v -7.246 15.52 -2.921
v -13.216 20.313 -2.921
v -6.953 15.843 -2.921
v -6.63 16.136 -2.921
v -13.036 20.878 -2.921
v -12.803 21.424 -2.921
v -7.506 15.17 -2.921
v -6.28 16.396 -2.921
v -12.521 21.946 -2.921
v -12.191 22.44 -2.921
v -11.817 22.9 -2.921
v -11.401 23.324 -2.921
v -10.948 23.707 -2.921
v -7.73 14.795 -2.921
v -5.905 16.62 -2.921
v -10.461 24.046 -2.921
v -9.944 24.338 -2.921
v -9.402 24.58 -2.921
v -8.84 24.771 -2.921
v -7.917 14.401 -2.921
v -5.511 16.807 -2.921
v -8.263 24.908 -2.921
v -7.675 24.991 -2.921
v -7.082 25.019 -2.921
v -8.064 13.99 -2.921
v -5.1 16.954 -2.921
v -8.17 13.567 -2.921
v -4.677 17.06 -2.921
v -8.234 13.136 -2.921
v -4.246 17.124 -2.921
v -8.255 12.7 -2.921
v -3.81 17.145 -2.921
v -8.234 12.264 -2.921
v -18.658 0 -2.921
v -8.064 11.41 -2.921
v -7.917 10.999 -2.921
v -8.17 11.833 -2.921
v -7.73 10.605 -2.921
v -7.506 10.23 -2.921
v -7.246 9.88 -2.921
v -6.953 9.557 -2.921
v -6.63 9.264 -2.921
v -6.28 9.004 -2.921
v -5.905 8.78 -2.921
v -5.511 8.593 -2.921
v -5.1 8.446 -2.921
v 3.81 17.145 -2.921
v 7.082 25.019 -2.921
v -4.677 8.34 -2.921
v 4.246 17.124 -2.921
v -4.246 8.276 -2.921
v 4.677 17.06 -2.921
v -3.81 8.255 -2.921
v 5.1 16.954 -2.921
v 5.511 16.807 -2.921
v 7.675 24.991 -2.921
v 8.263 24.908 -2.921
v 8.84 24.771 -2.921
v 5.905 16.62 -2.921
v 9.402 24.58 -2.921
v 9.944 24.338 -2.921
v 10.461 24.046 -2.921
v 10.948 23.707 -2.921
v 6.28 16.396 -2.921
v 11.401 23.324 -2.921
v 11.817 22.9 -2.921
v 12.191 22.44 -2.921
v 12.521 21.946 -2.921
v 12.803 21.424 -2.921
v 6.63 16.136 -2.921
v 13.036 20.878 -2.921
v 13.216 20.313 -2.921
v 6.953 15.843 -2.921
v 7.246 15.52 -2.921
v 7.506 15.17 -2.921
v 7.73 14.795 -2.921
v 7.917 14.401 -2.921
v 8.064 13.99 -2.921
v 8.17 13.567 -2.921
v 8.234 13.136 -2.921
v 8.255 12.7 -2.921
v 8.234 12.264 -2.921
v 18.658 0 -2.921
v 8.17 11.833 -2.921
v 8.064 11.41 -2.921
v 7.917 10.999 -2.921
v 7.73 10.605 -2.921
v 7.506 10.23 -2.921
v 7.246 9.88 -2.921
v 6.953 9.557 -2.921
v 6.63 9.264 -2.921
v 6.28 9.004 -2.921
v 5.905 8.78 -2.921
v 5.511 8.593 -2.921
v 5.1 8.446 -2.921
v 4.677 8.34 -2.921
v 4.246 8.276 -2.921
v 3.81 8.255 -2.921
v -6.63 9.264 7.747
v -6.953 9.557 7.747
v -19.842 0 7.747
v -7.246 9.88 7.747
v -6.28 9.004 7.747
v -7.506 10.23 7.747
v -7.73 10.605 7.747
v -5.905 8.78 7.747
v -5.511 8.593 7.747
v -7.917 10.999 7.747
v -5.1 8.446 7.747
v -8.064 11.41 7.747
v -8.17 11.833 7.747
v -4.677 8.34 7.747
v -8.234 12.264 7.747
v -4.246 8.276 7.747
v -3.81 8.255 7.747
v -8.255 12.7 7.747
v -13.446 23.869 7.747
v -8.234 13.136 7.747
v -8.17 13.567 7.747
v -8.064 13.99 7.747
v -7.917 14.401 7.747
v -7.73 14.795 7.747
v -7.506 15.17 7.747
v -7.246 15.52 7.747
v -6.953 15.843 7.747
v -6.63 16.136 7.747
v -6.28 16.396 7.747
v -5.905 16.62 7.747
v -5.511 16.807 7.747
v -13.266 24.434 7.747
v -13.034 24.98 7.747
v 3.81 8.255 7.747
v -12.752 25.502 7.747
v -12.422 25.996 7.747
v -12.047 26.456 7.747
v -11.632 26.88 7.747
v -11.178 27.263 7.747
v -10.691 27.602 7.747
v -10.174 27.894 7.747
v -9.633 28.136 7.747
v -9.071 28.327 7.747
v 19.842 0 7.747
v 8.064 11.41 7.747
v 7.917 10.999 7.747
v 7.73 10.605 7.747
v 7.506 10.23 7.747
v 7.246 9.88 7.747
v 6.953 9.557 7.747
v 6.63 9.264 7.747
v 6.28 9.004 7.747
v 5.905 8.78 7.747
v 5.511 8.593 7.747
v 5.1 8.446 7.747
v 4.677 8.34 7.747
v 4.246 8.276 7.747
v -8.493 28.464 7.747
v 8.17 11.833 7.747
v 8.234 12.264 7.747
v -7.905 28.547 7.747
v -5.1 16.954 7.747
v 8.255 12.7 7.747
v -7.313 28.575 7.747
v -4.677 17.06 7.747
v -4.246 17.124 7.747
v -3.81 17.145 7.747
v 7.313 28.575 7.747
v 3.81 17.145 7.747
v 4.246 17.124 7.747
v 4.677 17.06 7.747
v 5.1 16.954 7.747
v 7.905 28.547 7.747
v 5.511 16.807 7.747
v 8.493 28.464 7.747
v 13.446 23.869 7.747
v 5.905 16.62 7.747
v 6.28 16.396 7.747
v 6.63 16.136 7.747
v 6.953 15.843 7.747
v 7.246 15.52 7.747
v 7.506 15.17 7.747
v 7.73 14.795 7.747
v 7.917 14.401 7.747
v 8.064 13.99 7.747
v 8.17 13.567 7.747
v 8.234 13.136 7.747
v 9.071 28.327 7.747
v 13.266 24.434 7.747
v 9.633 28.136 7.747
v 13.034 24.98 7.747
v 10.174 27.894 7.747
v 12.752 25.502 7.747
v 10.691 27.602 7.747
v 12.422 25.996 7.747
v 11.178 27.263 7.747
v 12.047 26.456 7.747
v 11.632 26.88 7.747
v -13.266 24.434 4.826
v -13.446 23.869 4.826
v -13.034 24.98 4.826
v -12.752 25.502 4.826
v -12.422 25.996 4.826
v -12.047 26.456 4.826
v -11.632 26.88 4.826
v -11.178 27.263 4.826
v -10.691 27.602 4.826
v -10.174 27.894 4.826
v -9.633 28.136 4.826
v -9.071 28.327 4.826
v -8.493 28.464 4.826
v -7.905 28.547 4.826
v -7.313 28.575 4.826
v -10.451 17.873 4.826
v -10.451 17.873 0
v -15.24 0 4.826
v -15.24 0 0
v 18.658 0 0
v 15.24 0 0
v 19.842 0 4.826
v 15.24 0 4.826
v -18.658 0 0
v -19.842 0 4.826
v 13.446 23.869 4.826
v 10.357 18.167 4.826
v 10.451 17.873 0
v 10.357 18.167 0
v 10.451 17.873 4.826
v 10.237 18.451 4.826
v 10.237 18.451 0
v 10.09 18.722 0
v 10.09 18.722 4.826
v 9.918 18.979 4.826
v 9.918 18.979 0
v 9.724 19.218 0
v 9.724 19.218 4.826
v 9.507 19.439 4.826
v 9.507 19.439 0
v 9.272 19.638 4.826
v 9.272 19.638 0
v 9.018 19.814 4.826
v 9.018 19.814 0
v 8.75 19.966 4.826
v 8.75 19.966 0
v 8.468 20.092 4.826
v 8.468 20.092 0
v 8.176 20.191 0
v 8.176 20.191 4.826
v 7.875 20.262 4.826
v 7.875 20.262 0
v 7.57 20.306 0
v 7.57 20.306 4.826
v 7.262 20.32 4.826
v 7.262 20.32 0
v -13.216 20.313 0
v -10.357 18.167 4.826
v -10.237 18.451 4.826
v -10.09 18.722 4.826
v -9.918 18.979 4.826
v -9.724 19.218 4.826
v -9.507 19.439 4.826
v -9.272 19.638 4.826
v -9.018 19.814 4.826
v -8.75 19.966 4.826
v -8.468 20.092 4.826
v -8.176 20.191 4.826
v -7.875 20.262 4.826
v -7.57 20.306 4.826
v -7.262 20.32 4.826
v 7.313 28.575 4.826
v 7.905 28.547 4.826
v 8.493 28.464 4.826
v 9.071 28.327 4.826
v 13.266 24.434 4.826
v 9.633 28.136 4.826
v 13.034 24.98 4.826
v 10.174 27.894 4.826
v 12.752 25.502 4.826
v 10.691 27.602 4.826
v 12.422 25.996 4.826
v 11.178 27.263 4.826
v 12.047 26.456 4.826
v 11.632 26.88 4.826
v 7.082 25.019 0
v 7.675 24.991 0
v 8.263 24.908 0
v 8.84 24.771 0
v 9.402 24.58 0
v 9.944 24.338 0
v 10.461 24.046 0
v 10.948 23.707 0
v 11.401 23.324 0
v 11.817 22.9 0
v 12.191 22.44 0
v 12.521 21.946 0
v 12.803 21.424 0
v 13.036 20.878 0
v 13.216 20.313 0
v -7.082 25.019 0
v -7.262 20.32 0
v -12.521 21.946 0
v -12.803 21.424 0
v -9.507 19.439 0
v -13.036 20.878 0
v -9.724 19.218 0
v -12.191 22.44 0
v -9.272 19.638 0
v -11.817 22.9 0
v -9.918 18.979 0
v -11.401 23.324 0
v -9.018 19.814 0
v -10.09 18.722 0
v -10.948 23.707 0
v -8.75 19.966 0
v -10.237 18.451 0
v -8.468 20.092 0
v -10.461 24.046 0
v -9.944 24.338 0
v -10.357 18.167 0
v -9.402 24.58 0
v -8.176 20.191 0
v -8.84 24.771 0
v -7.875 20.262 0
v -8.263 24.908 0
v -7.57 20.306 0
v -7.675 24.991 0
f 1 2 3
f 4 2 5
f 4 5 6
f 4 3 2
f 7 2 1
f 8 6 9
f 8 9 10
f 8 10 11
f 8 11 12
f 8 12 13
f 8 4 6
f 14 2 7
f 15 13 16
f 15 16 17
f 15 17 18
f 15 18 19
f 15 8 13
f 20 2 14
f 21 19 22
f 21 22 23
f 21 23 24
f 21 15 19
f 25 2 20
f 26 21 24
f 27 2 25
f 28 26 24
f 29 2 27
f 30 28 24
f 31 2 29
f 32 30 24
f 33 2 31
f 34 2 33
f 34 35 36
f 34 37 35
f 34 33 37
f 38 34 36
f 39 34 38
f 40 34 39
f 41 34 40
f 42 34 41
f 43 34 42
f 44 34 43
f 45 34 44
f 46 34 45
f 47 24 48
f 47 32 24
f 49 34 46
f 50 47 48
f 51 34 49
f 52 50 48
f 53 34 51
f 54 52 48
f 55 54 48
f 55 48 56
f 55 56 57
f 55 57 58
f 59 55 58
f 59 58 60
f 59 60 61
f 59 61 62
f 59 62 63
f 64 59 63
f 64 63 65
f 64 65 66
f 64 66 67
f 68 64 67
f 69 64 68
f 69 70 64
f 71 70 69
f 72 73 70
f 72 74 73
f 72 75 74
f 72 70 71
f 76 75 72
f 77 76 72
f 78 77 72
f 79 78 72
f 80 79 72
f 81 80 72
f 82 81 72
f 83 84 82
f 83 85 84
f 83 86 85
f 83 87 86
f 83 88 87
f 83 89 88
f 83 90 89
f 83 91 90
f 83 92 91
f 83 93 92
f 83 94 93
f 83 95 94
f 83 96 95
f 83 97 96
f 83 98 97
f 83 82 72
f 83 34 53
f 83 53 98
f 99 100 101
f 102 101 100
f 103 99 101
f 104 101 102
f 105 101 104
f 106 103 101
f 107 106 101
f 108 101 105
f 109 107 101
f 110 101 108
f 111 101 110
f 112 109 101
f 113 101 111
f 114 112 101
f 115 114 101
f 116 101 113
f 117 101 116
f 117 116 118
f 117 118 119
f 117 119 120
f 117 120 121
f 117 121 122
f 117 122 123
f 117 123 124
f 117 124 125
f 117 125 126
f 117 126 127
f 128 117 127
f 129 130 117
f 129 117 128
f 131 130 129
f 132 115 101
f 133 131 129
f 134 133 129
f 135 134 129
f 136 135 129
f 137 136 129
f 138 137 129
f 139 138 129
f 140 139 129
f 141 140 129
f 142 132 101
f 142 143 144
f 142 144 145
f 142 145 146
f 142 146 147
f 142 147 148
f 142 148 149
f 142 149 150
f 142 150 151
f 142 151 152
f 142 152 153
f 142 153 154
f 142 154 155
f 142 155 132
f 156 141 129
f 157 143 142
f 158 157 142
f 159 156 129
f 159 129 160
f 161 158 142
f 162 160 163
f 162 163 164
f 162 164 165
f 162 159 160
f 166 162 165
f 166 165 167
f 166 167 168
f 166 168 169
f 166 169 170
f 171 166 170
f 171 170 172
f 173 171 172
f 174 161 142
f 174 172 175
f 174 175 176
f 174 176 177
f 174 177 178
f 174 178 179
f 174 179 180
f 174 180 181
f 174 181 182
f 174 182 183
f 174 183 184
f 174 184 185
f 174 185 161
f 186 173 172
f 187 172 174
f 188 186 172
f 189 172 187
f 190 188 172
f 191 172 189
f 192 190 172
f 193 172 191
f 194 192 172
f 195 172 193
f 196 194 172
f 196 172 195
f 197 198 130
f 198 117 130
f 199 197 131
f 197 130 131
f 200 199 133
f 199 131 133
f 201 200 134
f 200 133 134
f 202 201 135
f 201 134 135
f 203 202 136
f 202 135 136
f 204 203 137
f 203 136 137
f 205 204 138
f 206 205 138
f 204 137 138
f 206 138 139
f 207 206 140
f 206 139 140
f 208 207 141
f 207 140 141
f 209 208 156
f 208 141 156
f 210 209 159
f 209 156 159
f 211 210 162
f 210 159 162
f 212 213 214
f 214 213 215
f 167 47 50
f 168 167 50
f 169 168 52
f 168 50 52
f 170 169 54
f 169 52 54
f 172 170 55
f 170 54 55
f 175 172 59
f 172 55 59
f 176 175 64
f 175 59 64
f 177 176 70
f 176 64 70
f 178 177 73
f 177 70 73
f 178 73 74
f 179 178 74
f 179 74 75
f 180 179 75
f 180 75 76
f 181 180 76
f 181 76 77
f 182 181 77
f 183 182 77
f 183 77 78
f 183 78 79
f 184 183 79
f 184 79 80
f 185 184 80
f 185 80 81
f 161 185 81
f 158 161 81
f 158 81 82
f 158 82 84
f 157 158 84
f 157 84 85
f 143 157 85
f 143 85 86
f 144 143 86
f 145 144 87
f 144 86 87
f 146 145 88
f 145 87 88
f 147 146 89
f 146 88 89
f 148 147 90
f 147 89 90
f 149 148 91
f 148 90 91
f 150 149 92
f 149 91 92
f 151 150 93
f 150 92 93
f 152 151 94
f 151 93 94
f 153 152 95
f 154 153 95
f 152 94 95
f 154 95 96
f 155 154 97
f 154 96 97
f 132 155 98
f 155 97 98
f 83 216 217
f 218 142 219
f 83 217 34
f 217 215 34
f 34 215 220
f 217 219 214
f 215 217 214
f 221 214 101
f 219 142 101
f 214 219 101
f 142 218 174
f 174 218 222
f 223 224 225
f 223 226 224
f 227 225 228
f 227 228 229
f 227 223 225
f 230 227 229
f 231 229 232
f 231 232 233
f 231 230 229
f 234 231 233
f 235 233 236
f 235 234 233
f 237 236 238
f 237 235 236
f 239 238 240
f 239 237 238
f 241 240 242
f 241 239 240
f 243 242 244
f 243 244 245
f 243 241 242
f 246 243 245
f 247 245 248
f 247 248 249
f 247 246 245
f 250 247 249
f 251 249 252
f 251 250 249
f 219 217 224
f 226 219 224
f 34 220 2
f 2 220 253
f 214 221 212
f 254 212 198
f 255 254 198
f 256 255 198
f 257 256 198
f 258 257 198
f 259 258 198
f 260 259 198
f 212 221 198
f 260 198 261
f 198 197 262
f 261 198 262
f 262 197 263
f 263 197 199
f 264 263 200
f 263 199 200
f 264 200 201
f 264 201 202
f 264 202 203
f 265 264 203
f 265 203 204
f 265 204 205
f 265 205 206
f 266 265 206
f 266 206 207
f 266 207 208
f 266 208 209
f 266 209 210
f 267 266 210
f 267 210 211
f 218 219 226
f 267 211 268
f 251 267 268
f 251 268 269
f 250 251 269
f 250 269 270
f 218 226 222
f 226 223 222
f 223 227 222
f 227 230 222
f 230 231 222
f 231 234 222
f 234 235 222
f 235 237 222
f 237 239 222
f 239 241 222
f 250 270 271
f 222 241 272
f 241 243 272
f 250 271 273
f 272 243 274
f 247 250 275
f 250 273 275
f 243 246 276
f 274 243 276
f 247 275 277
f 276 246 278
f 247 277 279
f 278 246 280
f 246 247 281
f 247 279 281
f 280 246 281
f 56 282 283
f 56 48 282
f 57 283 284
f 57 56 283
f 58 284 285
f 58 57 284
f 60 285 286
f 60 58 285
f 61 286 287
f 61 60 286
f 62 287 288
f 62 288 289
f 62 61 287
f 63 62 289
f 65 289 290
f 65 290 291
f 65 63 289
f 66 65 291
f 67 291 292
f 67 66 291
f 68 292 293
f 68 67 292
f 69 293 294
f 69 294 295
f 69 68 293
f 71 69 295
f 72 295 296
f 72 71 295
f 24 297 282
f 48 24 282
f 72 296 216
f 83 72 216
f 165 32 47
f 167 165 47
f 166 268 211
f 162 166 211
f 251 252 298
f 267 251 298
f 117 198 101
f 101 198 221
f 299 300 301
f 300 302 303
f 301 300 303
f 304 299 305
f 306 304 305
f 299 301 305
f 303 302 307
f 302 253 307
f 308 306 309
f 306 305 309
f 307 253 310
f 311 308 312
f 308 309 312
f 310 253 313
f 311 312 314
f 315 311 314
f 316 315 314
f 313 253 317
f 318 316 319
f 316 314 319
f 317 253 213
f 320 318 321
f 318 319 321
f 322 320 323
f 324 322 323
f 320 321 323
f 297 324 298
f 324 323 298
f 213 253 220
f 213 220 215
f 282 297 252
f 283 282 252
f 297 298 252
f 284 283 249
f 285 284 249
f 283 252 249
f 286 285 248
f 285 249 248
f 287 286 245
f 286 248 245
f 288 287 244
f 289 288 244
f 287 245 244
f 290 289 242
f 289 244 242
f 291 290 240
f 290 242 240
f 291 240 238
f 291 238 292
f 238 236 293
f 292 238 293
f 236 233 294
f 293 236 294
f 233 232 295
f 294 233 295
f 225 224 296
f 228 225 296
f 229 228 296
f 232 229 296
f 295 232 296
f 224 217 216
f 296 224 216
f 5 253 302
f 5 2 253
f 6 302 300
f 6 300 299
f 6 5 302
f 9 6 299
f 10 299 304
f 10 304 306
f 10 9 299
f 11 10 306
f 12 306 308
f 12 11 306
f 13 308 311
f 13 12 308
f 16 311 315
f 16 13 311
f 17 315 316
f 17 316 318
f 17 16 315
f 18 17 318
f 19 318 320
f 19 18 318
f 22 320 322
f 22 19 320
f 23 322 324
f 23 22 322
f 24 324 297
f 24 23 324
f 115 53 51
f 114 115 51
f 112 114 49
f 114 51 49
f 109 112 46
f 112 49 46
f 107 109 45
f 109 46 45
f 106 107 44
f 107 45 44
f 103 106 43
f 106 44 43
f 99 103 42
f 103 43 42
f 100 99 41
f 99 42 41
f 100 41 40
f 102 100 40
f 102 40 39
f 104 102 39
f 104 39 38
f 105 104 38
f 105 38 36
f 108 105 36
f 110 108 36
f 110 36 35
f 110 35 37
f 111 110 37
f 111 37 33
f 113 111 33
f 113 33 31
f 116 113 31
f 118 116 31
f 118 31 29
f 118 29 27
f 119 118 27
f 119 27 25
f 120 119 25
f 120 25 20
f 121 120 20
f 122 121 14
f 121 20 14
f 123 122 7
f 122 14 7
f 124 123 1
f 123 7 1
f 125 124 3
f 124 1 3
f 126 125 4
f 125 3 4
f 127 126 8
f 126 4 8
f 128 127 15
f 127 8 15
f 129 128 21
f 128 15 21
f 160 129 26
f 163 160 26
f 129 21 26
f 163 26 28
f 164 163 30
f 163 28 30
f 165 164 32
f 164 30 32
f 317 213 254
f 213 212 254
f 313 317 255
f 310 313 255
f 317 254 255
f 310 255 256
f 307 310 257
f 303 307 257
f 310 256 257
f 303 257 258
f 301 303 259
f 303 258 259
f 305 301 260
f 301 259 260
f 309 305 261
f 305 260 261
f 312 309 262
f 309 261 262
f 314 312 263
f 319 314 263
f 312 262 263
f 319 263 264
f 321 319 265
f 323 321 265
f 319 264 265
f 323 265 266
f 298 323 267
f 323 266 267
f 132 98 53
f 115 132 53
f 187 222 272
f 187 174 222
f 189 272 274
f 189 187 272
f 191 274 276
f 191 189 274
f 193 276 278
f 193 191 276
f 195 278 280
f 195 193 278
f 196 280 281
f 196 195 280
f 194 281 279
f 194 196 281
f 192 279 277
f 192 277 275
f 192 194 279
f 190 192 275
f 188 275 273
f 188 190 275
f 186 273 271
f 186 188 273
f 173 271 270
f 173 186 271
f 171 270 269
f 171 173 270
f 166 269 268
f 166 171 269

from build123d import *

# Parameters (mm, degrees)
F1_DEPTH = 4.826
F3_DEPTH = 2.921
F5_DEPTH = 2.921
F7_DEPTH = 25.4
F8_R     = 3.302
F9_R     = 6.35


with BuildPart() as f1:
    # F0 (on Top) → F1 (new body)
    with BuildSketch(Plane.XY):
        Polygon((-9.795272, 20.32), (-15.24, 0), (15.24, 0), (9.795272, 20.32), align=None)
    extrude(amount=F1_DEPTH)

    # F2 (on face) → F3 (join)
    with BuildSketch(Plane.XY.offset(4.826)):
        Polygon((-19.841803, 0), (19.841803, 0), (12.185154, 28.575), (-12.185154, 28.575), align=None)
    extrude(amount=F3_DEPTH)

    # F4 (on face) → F5 (join)
    with BuildSketch(Plane(origin=(0, 0, 0), x_dir=(1, 0, 0), z_dir=(0, 0, -1))):
        Polygon((18.658482, 0), (-18.658482, 0), (-11.954661, -25.019), (11.954661, -25.019), align=None)
    extrude(amount=F5_DEPTH)

    # F6 (on face) → F7 (cut)
    with BuildSketch(Plane(origin=(0, 0, -2.921), x_dir=(1, 0, 0), z_dir=(0, 0, -1))):
        with BuildLine():
            Line((3.81, -8.255), (-3.81, -8.255))
            ThreePointArc((-3.81, -8.255), (-8.255, -12.7), (-3.81, -17.145))
            Line((-3.81, -17.145), (3.81, -17.145))
            ThreePointArc((3.81, -17.145), (8.255, -12.7), (3.81, -8.255))
        make_face()
    extrude(amount=-F7_DEPTH, mode=Mode.SUBTRACT)

    # F8
    f8_edges = [f1.edges().sort_by_distance(p)[0] for p in [
        (9.795272, 20.32, 2.413),
        (-9.795272, 20.32, 2.413),
    ]]
    fillet(f8_edges, radius=F8_R)

    # F9
    f9_edges = [f1.edges().sort_by_distance(p)[0] for p in [
        (12.185154, 28.575, 6.2865),
        (-12.185154, 28.575, 6.2865),
        (11.954661, 25.019, -1.4605),
        (-11.954661, 25.019, -1.4605),
    ]]
    fillet(f9_edges, radius=F9_R)


solid = f1.part
